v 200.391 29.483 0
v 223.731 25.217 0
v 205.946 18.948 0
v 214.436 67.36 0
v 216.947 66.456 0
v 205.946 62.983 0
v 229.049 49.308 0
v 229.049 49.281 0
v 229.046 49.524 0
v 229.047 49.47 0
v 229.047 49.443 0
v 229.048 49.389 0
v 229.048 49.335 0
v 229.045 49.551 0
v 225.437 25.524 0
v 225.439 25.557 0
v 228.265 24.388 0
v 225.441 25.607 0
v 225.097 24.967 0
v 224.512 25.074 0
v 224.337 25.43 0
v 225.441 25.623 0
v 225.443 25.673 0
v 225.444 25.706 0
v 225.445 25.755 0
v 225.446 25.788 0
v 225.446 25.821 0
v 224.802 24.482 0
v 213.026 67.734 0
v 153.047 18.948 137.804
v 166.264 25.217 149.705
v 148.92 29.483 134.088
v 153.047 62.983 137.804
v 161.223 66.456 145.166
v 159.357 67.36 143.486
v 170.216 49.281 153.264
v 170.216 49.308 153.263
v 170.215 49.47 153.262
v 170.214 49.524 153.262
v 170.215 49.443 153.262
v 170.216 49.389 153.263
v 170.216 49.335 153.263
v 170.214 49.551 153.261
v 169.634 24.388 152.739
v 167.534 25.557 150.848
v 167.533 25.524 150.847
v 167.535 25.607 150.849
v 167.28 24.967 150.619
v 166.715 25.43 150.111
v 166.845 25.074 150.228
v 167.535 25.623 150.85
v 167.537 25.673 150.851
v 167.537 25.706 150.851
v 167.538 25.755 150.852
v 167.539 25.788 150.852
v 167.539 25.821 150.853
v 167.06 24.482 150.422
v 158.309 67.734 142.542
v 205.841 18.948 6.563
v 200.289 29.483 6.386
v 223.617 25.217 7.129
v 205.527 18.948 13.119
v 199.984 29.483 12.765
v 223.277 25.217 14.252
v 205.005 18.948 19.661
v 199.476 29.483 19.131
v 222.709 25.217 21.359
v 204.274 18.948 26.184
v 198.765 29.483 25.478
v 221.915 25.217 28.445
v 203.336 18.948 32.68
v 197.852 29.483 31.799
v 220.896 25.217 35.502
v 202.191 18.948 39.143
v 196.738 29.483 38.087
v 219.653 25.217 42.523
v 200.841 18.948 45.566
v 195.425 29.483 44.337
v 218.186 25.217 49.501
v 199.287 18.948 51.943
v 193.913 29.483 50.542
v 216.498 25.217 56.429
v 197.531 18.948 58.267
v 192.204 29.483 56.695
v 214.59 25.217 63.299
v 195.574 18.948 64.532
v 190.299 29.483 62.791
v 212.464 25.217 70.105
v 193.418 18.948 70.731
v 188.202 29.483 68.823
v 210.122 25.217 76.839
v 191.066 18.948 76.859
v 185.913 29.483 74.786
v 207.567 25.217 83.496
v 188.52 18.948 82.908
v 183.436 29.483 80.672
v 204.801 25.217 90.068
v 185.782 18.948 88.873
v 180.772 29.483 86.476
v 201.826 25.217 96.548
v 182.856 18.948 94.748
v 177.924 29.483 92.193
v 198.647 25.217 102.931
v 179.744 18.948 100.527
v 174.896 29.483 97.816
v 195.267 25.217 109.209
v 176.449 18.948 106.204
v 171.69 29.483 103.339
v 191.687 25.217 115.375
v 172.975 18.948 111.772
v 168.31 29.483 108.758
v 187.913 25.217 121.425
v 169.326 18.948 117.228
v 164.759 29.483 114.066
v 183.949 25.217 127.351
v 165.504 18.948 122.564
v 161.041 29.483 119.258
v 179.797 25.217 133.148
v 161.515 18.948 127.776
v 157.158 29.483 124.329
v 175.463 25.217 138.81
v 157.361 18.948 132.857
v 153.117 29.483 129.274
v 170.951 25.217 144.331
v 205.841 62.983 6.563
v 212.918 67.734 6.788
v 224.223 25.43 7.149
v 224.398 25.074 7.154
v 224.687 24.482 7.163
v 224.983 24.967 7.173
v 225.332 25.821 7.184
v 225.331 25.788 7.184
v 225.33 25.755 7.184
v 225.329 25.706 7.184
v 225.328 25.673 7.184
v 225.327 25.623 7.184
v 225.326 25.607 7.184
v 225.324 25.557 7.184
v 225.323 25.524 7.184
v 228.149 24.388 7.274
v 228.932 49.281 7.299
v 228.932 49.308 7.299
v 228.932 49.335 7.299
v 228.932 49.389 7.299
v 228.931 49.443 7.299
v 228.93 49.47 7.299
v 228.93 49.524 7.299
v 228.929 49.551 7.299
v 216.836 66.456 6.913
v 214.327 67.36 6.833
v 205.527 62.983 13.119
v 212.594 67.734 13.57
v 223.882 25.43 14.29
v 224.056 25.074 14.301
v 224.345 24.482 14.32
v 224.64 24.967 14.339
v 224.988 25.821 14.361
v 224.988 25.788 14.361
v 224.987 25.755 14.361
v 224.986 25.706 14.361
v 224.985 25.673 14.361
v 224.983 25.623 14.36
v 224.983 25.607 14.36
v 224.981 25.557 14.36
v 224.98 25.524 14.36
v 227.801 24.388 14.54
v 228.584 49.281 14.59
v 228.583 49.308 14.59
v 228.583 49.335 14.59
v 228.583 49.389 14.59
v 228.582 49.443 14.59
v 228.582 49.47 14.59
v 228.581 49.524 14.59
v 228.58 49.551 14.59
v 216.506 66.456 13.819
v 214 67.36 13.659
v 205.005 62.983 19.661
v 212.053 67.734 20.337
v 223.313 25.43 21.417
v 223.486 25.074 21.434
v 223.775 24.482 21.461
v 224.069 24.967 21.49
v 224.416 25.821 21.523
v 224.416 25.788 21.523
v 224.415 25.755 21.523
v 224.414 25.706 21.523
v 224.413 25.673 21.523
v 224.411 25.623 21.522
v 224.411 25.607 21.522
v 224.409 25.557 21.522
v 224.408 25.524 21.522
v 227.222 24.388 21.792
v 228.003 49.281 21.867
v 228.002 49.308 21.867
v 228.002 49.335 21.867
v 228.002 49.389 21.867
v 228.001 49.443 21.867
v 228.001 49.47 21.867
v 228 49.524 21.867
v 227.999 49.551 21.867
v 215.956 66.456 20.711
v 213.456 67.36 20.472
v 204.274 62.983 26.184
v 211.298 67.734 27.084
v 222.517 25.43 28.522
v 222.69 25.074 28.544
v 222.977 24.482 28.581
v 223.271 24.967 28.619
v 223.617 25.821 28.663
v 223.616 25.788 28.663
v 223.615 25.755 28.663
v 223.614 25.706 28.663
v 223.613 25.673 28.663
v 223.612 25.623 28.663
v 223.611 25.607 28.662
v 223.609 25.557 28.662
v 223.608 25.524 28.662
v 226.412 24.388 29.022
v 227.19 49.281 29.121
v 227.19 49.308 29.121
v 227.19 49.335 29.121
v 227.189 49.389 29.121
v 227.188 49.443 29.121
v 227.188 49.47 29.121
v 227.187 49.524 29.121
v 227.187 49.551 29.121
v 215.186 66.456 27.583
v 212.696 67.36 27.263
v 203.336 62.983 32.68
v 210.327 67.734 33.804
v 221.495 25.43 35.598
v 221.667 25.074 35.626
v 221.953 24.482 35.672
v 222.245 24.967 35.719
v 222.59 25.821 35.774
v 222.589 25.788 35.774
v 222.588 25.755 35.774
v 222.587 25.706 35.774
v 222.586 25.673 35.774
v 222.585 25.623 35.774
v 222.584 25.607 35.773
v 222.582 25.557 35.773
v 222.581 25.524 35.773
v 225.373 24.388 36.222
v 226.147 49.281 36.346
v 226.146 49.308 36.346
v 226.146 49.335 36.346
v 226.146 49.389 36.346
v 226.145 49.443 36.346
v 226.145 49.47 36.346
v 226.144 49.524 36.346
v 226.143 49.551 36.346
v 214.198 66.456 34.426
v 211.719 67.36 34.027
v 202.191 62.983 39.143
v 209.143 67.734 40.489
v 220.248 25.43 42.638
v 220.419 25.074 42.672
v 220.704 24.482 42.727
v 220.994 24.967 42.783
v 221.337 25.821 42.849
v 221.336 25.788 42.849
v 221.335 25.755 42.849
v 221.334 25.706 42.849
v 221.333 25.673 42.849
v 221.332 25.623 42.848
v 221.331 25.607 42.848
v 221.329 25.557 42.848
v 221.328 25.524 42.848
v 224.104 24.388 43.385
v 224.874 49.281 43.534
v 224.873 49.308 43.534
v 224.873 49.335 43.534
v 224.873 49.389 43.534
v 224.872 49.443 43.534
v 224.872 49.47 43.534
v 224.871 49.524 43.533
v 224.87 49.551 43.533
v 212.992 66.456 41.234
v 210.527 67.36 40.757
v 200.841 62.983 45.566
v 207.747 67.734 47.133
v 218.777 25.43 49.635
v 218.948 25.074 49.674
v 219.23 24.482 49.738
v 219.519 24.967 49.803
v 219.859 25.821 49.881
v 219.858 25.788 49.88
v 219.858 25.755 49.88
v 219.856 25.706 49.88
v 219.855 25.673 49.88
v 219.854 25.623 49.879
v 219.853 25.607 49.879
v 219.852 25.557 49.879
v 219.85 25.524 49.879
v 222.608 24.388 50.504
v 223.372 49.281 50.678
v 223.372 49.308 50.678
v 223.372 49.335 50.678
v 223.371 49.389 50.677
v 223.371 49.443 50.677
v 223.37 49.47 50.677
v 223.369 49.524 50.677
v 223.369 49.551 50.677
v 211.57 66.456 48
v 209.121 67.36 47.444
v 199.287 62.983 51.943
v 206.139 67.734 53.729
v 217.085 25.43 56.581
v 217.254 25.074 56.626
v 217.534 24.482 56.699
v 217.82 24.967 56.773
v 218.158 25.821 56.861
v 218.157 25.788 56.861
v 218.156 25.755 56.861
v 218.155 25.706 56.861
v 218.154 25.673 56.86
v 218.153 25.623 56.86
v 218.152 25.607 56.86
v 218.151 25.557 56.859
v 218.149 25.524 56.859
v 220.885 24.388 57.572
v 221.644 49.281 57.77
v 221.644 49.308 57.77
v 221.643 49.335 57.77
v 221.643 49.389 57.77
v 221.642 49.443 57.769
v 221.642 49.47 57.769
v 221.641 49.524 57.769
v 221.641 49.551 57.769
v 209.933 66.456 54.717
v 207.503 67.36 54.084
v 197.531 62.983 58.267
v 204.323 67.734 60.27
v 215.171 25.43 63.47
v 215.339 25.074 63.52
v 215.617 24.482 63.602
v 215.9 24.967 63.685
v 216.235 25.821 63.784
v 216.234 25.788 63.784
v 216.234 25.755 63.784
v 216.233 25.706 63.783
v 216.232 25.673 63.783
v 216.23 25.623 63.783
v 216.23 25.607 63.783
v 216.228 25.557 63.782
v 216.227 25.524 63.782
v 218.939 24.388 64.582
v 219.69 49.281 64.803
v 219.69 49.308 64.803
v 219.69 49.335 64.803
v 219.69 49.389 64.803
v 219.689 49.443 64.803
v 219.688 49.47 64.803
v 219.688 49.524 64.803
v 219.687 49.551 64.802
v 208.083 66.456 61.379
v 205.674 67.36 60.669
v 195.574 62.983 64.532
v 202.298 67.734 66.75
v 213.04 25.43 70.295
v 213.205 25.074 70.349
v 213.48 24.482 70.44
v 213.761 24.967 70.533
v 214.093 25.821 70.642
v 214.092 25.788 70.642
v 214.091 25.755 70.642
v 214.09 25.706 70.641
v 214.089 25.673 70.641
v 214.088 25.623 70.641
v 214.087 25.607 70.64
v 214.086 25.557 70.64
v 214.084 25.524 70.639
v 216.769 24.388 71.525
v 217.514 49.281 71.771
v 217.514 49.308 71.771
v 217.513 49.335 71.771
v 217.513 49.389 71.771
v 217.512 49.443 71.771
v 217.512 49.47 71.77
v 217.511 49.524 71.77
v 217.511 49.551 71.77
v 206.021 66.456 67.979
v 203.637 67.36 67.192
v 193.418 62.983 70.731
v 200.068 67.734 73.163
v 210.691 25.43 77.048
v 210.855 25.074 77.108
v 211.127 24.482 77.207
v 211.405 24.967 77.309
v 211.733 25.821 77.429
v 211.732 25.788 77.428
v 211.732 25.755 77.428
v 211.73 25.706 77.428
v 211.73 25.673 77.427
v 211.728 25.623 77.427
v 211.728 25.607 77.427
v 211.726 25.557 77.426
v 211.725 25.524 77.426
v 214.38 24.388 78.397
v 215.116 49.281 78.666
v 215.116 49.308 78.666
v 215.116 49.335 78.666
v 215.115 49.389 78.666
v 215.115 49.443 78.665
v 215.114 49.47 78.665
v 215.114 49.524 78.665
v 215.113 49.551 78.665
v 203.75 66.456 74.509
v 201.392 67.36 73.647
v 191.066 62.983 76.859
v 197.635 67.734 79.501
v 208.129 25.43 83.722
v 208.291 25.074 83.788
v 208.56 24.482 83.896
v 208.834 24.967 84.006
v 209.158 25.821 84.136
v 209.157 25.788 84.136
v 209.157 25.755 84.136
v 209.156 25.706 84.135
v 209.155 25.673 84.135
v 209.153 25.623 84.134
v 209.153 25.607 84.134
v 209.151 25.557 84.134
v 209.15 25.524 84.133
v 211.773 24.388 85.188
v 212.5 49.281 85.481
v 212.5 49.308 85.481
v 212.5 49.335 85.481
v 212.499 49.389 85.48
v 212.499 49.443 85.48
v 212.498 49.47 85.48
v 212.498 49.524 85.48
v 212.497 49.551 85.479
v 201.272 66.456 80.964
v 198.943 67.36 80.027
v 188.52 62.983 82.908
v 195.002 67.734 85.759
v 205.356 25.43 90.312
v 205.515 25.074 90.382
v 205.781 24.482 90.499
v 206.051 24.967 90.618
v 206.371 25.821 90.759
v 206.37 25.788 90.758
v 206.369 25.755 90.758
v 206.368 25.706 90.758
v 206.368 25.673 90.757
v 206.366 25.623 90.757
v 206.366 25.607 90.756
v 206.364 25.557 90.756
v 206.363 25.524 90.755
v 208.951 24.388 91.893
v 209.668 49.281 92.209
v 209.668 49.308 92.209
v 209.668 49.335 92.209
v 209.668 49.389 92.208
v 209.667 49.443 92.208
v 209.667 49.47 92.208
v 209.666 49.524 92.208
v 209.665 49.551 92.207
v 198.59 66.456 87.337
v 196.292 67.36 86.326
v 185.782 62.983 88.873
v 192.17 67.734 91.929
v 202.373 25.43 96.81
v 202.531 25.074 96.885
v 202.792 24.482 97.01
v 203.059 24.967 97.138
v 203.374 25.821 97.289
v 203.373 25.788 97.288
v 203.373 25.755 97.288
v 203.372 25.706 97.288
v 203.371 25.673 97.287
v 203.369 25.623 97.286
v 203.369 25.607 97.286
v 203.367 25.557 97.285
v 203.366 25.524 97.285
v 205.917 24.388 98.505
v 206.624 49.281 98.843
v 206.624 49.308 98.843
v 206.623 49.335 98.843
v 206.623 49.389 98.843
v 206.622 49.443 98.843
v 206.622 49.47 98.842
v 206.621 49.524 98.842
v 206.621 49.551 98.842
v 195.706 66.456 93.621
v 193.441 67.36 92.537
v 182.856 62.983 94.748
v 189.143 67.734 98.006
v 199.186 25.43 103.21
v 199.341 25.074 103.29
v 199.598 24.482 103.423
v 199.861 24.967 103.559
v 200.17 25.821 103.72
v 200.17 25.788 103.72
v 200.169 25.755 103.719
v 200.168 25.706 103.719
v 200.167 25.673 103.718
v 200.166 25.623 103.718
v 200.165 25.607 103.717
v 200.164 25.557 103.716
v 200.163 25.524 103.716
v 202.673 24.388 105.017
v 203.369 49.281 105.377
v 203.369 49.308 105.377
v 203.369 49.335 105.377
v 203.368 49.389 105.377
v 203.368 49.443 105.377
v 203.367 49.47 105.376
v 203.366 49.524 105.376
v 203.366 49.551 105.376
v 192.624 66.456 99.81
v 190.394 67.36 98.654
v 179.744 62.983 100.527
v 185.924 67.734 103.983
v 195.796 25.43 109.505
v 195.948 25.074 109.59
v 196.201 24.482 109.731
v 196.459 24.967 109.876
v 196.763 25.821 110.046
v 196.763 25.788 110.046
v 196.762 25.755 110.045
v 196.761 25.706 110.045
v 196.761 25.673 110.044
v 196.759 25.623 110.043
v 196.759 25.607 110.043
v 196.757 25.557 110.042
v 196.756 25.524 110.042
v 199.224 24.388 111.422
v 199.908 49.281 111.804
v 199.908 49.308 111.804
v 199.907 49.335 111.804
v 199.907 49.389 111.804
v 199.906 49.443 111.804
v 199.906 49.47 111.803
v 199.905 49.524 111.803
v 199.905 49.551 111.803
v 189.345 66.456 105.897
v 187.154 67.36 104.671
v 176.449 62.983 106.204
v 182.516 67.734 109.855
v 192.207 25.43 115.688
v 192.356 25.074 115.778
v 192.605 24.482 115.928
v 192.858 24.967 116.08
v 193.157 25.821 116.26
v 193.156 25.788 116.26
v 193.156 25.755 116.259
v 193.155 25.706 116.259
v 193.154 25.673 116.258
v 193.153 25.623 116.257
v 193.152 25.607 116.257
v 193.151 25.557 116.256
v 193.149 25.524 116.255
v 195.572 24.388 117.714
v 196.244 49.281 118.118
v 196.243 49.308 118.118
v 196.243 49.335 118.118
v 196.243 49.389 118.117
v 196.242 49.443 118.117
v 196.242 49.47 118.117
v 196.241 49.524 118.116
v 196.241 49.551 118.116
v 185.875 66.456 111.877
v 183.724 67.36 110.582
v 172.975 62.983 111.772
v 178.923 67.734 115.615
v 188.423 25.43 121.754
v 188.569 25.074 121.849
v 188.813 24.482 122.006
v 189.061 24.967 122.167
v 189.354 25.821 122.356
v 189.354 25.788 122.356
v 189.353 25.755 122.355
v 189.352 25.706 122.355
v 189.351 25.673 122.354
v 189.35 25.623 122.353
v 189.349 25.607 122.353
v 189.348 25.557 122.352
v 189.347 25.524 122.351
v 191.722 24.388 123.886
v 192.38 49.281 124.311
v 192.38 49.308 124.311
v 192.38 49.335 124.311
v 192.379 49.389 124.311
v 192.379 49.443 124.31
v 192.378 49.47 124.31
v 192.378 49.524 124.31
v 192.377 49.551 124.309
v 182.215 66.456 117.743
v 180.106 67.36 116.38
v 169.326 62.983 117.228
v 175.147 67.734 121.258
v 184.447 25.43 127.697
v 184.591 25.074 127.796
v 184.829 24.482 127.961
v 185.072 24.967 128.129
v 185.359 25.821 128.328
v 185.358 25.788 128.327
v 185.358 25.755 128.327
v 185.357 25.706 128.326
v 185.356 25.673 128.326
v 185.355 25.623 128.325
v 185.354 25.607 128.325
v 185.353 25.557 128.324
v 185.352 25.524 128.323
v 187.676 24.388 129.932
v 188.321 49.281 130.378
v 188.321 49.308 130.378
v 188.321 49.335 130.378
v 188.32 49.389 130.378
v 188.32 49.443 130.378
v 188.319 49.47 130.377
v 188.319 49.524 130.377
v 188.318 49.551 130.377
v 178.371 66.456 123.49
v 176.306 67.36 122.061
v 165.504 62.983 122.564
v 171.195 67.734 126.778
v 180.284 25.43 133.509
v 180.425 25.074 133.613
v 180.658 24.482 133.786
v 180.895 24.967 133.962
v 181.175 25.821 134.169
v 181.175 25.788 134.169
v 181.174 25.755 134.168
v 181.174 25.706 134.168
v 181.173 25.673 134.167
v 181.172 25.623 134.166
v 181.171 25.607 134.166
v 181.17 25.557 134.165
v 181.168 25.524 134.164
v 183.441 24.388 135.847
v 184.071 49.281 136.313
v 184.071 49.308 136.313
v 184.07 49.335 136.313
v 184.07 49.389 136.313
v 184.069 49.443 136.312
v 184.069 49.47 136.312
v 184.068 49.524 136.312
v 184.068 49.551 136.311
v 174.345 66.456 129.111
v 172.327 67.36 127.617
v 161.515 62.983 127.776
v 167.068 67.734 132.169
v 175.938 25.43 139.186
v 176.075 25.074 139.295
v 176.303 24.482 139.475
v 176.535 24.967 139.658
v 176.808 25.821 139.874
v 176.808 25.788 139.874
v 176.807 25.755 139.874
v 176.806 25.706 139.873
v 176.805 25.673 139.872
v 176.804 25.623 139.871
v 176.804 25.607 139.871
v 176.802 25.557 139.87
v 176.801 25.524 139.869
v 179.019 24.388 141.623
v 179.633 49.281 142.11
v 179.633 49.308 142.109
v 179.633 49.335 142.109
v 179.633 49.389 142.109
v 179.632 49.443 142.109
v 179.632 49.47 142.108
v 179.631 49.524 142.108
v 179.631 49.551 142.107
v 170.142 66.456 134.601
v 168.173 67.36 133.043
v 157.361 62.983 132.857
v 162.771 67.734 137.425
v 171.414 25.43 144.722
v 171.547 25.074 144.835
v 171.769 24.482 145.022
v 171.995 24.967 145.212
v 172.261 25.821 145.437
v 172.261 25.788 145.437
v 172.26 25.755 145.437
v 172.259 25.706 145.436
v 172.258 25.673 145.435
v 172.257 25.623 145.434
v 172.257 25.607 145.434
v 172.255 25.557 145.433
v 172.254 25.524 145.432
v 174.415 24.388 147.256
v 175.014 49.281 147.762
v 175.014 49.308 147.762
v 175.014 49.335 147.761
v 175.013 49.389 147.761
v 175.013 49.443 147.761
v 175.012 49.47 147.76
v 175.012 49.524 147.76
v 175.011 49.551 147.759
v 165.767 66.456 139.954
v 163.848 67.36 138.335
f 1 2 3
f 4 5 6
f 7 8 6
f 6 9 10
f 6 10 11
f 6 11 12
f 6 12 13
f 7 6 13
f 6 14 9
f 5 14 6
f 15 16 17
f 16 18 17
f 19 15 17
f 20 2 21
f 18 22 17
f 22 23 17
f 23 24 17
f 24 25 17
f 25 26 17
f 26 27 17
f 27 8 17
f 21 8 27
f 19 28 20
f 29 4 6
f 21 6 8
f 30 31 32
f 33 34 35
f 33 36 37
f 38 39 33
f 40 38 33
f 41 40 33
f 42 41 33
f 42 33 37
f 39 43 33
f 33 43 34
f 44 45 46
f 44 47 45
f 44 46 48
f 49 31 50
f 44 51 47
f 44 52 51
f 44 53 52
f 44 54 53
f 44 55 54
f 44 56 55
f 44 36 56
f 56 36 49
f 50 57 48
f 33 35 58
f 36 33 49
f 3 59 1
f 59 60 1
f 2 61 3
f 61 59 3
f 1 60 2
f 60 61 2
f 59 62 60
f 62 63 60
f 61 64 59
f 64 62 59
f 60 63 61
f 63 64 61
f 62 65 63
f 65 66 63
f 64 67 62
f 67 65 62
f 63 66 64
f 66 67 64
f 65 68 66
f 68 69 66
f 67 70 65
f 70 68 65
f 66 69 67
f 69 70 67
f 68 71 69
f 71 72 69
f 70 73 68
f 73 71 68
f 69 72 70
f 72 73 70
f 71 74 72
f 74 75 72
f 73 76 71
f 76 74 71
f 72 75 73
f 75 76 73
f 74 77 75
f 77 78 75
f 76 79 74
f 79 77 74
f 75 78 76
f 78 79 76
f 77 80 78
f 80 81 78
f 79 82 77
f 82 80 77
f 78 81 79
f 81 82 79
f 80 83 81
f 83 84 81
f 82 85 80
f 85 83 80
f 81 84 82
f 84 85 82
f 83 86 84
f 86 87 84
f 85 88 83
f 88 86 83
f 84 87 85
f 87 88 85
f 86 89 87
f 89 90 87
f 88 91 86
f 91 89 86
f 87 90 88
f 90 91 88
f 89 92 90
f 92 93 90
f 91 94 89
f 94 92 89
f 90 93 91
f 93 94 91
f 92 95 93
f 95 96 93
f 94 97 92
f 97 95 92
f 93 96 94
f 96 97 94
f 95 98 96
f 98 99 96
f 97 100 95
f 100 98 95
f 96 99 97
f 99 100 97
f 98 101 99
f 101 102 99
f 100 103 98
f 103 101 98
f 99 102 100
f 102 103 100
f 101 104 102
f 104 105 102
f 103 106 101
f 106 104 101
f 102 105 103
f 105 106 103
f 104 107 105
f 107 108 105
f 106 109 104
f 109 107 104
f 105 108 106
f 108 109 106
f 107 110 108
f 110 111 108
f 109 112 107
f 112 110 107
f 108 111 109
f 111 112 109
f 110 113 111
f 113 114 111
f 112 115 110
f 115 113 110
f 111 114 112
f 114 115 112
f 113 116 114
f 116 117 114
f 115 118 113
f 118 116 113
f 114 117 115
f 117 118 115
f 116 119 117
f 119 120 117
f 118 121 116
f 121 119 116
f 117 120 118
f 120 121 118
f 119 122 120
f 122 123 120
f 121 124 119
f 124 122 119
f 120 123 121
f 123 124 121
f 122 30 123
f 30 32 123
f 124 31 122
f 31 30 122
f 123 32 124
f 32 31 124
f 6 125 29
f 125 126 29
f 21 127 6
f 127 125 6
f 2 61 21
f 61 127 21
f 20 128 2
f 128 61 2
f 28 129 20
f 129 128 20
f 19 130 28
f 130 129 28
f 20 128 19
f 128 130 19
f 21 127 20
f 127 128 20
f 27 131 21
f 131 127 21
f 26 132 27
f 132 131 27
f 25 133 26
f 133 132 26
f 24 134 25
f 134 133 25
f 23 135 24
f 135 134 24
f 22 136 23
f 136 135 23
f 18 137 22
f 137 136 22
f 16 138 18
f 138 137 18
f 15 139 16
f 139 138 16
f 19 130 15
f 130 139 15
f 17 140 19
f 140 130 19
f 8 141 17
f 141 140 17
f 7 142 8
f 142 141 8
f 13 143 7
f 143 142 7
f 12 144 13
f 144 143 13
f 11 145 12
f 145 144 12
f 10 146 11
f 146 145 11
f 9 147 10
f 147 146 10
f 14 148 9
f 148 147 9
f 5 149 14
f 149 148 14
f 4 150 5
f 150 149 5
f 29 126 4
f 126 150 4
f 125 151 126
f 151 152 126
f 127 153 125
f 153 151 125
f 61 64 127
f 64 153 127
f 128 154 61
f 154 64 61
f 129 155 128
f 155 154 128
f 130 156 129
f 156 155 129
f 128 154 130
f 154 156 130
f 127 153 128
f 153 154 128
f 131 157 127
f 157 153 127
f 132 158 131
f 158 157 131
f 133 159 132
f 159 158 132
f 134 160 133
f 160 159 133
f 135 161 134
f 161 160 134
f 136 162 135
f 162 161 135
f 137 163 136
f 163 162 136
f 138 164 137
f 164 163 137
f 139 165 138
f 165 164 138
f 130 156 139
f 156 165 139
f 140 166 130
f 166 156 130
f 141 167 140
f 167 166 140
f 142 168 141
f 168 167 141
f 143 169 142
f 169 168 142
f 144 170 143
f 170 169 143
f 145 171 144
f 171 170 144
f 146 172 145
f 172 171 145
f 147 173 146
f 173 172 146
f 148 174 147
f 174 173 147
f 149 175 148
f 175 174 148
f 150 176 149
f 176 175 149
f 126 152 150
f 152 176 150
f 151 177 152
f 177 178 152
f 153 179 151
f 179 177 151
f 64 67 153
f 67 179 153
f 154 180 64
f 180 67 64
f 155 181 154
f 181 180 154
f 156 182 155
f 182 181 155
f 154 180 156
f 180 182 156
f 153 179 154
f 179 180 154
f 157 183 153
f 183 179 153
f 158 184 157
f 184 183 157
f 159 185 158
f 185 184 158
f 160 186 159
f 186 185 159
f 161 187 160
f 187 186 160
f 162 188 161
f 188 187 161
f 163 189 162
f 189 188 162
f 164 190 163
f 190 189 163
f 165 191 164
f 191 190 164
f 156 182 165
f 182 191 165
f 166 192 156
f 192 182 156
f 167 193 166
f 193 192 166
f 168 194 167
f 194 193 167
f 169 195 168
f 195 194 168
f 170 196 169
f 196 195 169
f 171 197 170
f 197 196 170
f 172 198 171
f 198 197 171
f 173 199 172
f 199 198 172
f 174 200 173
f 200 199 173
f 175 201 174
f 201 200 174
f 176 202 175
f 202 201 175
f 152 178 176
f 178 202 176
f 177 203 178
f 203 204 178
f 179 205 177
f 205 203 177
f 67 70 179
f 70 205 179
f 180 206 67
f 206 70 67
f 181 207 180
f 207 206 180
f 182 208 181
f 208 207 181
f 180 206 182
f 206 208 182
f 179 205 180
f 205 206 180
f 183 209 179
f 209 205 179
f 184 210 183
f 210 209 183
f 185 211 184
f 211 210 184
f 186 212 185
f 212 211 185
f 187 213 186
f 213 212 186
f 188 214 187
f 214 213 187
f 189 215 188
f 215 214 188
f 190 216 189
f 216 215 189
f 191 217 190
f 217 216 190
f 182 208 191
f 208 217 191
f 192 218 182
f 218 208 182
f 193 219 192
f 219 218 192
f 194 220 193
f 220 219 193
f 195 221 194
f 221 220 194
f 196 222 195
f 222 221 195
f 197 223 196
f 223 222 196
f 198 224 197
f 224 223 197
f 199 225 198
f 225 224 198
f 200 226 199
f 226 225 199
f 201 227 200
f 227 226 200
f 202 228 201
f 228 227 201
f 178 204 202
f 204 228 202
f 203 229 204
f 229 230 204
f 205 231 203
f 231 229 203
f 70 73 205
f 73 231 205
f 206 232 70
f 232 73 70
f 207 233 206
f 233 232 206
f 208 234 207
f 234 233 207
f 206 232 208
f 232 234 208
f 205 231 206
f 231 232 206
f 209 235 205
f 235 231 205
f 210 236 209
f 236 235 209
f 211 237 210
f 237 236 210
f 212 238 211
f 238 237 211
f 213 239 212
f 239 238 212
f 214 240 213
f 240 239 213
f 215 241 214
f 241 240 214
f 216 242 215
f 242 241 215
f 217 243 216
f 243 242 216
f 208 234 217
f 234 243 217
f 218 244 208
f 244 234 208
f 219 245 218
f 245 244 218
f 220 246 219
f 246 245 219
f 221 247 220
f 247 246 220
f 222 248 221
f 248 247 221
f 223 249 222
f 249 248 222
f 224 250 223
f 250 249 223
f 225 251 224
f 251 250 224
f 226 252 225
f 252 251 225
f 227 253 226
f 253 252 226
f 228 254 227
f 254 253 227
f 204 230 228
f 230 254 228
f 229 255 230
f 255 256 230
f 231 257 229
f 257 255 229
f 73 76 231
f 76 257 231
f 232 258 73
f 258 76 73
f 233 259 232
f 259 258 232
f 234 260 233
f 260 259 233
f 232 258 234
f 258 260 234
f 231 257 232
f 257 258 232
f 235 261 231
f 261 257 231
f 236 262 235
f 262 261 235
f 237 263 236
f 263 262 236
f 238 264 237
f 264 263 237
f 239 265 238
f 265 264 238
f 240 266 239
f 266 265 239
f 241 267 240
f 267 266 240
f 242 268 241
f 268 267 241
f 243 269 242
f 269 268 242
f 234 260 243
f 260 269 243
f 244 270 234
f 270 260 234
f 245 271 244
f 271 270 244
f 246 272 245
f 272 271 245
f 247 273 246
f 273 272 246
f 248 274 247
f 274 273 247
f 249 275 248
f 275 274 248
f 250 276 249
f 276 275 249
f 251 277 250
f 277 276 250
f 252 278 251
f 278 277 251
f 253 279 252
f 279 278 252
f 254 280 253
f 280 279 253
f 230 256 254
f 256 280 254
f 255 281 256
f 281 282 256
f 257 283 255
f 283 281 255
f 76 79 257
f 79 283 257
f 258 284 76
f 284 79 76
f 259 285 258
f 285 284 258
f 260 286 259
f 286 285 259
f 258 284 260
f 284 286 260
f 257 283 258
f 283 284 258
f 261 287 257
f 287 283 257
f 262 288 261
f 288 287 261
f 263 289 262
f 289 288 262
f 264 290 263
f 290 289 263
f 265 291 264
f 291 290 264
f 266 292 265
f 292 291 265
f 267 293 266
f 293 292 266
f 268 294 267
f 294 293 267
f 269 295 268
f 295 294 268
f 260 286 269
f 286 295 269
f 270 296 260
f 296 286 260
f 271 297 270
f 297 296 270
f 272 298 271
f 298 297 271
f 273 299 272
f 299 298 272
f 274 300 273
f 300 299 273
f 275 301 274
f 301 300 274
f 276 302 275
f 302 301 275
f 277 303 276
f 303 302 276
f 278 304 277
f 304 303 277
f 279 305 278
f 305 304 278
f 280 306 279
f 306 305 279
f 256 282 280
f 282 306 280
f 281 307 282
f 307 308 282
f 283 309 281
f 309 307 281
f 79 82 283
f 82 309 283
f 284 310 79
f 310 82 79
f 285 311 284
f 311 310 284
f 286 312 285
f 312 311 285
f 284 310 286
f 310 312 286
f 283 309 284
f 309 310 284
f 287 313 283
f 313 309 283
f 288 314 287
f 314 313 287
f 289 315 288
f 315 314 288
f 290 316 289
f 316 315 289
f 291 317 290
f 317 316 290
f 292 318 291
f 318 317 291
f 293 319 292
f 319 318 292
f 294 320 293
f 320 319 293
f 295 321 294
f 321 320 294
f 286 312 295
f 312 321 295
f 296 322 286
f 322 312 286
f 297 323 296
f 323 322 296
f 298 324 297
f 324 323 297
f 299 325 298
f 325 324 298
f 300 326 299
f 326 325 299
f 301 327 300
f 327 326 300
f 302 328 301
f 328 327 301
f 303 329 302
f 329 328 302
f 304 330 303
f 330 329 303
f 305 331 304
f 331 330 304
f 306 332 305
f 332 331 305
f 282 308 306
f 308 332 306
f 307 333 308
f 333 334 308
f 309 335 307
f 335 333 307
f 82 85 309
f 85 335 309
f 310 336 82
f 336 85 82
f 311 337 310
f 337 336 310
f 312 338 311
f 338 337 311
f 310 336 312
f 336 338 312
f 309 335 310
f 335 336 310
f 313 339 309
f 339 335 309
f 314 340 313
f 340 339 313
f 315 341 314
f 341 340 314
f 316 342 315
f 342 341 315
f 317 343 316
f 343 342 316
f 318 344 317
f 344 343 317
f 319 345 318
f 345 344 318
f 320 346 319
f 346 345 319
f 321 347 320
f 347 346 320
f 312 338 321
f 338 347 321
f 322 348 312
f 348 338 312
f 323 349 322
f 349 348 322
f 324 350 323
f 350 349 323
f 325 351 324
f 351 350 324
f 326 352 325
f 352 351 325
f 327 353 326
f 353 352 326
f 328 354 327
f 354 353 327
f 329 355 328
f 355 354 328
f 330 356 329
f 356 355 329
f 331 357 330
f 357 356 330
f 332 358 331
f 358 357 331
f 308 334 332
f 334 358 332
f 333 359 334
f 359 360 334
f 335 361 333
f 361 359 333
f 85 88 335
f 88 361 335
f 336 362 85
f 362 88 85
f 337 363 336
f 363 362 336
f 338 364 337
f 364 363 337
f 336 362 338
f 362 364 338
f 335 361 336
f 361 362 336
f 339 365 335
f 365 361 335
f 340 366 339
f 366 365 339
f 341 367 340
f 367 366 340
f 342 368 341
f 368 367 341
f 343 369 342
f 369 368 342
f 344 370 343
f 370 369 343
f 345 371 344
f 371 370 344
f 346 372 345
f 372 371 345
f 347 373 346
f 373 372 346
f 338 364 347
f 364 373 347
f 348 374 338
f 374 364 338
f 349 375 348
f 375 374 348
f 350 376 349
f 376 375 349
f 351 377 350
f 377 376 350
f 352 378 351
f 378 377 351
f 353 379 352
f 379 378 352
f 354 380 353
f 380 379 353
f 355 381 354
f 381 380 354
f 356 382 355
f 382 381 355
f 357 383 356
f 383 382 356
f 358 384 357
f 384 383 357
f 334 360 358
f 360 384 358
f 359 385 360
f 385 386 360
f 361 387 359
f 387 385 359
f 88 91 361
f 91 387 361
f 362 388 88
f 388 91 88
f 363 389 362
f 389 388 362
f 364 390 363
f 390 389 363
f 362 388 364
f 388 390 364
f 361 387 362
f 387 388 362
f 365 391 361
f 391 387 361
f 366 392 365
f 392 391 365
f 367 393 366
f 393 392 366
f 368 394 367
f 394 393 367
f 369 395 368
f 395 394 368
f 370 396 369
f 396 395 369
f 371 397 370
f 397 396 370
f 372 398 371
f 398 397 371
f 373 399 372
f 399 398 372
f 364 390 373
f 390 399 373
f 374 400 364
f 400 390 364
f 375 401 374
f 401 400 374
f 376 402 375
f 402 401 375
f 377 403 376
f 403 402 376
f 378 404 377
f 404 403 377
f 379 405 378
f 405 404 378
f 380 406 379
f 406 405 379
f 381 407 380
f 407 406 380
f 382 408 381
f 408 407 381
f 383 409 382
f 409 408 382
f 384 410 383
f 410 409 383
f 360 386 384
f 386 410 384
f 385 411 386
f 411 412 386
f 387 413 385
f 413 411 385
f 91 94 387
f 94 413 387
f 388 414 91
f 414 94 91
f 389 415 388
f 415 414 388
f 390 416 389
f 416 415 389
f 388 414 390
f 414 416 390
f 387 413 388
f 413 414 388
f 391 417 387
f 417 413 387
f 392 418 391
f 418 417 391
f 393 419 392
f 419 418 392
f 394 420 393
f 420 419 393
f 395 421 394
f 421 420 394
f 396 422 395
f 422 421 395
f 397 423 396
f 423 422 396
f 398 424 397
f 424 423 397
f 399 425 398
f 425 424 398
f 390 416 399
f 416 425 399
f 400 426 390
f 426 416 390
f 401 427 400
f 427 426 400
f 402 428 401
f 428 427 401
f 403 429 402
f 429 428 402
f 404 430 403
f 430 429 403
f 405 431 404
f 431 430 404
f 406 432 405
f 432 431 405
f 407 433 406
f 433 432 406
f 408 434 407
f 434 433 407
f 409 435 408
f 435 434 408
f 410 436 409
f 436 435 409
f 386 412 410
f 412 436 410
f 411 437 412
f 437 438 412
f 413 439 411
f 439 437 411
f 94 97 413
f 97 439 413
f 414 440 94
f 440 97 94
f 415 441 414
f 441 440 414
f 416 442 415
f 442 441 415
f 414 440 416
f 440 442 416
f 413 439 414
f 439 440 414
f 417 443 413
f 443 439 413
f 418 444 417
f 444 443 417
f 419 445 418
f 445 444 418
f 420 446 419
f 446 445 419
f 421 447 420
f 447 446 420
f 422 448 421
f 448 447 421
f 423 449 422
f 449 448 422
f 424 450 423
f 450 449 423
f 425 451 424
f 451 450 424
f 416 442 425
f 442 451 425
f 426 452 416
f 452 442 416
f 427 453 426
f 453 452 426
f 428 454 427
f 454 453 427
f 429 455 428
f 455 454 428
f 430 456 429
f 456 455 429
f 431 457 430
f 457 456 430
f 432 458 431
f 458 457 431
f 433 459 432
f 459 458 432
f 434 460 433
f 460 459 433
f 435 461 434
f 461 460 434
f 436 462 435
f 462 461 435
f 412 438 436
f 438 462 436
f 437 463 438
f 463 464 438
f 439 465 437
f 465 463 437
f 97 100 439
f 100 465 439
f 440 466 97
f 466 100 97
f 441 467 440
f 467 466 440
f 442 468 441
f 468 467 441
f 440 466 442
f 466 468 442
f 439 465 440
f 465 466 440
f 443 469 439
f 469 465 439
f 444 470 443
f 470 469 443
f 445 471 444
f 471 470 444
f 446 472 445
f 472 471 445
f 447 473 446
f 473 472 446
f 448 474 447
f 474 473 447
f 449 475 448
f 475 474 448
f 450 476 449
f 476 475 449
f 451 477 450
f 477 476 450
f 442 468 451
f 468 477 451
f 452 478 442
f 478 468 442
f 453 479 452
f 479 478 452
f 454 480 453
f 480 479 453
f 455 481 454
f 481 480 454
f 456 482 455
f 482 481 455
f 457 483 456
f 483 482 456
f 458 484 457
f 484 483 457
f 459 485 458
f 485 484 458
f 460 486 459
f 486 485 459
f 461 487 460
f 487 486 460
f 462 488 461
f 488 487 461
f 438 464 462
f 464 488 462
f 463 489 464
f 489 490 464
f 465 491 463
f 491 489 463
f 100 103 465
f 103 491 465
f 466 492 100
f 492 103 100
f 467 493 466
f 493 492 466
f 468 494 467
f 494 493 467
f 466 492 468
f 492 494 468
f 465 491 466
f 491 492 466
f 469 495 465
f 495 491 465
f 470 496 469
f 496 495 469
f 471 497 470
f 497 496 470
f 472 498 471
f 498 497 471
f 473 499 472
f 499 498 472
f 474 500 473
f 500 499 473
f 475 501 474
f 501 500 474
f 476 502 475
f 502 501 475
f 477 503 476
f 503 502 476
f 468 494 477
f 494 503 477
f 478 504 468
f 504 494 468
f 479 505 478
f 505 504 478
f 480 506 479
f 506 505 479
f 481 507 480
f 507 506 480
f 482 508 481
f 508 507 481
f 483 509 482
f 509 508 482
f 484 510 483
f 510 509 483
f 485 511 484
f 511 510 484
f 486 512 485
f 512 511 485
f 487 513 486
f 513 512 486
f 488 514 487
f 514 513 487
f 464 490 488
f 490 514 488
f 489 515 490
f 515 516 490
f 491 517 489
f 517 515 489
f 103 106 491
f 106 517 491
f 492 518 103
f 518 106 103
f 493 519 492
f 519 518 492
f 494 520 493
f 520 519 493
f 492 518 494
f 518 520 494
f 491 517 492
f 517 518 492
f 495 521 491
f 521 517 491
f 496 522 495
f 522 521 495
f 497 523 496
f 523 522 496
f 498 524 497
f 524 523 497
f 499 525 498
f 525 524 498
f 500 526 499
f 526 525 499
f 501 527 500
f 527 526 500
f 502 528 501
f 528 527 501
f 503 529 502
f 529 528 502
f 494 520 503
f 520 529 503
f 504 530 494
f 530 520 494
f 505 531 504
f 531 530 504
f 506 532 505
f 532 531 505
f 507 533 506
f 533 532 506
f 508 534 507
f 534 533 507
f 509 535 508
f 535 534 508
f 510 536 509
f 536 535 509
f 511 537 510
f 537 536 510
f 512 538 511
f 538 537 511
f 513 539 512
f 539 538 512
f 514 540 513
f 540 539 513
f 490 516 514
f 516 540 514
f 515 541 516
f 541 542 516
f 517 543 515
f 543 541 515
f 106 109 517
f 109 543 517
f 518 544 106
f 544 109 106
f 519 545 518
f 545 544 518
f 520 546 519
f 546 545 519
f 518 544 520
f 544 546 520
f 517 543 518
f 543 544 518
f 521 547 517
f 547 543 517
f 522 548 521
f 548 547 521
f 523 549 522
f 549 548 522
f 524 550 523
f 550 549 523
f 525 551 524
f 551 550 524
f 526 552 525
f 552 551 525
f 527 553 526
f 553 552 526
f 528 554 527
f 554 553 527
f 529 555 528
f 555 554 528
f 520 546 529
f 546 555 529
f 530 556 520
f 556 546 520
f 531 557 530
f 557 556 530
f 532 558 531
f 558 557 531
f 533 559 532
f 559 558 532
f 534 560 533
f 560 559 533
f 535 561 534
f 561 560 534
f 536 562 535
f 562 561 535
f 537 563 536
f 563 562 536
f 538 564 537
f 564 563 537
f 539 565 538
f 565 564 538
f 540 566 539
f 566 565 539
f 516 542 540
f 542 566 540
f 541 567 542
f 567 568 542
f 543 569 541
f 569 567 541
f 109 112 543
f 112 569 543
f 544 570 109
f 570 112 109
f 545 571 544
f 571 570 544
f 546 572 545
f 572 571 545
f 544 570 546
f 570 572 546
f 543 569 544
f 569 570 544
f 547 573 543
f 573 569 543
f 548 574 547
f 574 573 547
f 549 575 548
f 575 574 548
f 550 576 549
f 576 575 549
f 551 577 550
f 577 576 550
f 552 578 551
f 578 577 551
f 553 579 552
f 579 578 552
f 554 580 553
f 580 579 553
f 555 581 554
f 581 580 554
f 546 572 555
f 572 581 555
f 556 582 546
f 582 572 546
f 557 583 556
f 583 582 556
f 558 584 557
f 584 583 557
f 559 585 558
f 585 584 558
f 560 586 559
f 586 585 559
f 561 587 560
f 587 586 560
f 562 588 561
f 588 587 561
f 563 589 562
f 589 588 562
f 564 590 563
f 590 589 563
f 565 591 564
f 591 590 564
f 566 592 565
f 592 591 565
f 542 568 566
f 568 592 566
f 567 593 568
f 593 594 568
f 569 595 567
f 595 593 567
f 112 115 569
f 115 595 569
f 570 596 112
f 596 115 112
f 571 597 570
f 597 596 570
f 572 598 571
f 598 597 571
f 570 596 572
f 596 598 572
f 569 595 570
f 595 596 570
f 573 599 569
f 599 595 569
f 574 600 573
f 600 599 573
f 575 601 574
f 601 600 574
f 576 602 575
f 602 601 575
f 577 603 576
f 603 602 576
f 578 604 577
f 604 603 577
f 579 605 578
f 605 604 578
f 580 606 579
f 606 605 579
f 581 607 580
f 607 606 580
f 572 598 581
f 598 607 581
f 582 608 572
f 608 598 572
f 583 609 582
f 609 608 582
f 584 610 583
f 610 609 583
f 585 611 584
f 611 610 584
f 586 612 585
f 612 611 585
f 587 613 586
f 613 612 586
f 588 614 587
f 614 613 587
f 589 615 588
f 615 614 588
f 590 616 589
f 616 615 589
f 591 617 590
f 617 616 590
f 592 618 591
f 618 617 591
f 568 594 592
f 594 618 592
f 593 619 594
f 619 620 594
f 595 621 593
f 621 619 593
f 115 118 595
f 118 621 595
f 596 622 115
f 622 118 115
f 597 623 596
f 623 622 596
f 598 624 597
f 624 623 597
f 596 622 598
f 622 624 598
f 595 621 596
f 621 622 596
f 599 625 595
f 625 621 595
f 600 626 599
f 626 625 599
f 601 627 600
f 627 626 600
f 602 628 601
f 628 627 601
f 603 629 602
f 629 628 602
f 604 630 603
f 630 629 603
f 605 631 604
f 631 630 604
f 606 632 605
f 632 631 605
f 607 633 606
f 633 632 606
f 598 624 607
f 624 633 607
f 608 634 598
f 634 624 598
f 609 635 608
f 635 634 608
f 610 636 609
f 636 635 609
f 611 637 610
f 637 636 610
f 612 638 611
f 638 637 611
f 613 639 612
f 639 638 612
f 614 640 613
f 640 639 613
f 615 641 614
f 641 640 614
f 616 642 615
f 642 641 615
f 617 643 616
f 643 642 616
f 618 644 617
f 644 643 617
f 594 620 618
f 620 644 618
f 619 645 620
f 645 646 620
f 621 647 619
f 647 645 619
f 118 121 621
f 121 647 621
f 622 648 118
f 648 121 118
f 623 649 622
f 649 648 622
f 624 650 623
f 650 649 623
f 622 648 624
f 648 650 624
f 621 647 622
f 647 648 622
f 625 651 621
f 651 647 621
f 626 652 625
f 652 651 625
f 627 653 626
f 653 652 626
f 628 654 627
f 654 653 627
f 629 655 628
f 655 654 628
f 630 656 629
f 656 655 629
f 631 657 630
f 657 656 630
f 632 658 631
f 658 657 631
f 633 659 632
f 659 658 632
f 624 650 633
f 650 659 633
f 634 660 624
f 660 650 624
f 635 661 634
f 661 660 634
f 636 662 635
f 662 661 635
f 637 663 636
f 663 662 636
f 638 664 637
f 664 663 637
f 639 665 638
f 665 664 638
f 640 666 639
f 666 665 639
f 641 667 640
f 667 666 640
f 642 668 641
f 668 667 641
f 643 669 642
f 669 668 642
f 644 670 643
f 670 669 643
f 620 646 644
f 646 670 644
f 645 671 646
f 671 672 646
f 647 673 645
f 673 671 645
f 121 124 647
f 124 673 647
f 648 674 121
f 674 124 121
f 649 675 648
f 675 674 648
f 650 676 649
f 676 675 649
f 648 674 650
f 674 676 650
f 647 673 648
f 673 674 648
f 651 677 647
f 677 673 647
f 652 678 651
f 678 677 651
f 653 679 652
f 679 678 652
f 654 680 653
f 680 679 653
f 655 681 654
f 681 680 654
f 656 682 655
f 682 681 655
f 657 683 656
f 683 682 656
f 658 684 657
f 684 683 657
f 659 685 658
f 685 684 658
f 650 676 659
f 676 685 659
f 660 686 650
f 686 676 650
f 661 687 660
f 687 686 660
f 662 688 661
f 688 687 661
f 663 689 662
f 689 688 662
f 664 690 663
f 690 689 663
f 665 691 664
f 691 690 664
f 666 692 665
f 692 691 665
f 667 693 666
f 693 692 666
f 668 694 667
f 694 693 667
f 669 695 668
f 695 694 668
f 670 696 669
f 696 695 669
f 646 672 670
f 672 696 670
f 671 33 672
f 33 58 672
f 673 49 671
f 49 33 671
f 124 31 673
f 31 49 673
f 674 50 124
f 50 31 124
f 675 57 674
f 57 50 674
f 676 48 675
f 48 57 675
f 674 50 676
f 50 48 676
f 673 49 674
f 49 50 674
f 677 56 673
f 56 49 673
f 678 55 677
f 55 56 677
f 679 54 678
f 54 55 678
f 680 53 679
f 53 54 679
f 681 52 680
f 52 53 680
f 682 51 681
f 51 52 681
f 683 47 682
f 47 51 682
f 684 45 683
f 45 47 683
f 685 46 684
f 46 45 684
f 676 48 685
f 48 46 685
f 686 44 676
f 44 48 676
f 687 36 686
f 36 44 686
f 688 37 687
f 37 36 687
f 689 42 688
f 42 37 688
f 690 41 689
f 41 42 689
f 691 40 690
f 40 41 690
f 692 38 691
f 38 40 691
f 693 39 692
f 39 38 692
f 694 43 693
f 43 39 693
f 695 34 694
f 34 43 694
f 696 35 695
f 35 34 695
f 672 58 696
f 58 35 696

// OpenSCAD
// Parametric rebuild of SpongeHolder clamp (arc/line fit)
// Monolithic version (no STL import)
// Fit tolerance: 0.2mm

// Parametric rebuild of SpongeHolder clamp from STL slice
// Monolithic version (no STL import)
// Uses Z-slice profile, swept around Y axis
$fn = 200;  // increase sweep smoothness
// Parametric rebuild of SpongeHolder clamp from STL slice
// Step 1: Extract 2D profile (Z-slice) and trim tray
slice_z = 93.340206;          // Z slice height (from STL mid-plane)
show_profile = false;          // true: render 2D profile, false: 3D swept clamp
show_axis = true;             // show axis marker in 2D profile view
axis_marker_r = 2;
// Tray removal (adjust to trim the flat tray) - coordinates are in AXIS space
tray_cut_x = 228.277581;             // everything to the right of this gets removed
tray_cut_y = -196.481317;
tray_cut_w = 2000;
tray_cut_h = 2000;
// Top removal (adjust to trim any remaining tray at the top of the C-cup) - AXIS space
enable_top_cut = true;
top_cut_y = -11.781317;          // everything above this gets removed
top_cut_x = -1722.022419;
top_cut_w = 4000;
top_cut_h = 2000;
// Sweep parameters
sweep_angle = 42;            // degrees
axis_x = -277.977581;             // estimated axis center X (auto)
axis_y = -3.518683;             // estimated axis center Y (auto)
axis_shift_x = 0.000000;        // shift profile so all X >= 0 for rotate_extrude

// Arc/line segments (in axis space)
segments = [
    ["line", 214.435834, -67.359575, 216.946507, -66.456317],
    ["arc", 210.585963, -49.185557, 18.463031, -1.217927, -0.296605],
    ["line", 228.234247, -54.579225, 228.264910, -24.387933],
    ["line", 228.264910, -24.387933, 200.391089, -29.483434],
    ["line", 200.391089, -29.483434, 205.945532, -18.947513],
    ["arc", 214.402973, -25.995621, 11.044487, 0.818411, 2.446838],
    ["line", 221.950866, -17.932172, 224.801560, -24.482503],
    ["line", 224.801560, -24.482503, 205.945517, -62.983168],
    ["line", 205.945517, -62.983168, 213.026280, -67.734440],
    ["line", 213.026280, -67.734440, 214.435834, -67.359575]
];

function arc_points(cx, cy, r, a0, a1, n) =
    [for (i=[0:n]) [cx + r*cos(a0 + (a1-a0)*i/n), cy + r*sin(a0 + (a1-a0)*i/n)]];

function line_points(x0, y0, x1, y1, n) =
    [for (i=[0:n]) [x0 + (x1-x0)*i/n, y0 + (y1-y0)*i/n]];

function drop_first(arr) =
    [for (i=[1:len(arr)-1]) arr[i]];

function seg_points(seg, is_first) =
    seg[0] == "arc"
        ? (let(n = max(4, ceil(abs(seg[5]-seg[4]) / (5*PI/180))))
           (is_first ? arc_points(seg[1],seg[2],seg[3],seg[4],seg[5],n)
                    : drop_first(arc_points(seg[1],seg[2],seg[3],seg[4],seg[5],n))))
        : (let(n = 1)
           (is_first ? line_points(seg[1],seg[2],seg[3],seg[4],n)
                    : drop_first(line_points(seg[1],seg[2],seg[3],seg[4],n))));

function path_points(segs, i=0) =
    i >= len(segs) ? [] :
        concat(seg_points(segs[i], i==0), path_points(segs, i+1));

module raw_profile() {
    polygon(points=path_points(segments));
}

module clamp_profile() {
    // Profile already in axis space (with shift and cuts baked into segments)
    raw_profile();
}

if (show_profile) {
    clamp_profile();
    if (show_axis) {
        color("red")
            translate([0,0])
                circle(r=axis_marker_r, $fn=48);
    }
} else {
    rotate([90,0,0])
        rotate_extrude(angle=sweep_angle)
            clamp_profile();
}
